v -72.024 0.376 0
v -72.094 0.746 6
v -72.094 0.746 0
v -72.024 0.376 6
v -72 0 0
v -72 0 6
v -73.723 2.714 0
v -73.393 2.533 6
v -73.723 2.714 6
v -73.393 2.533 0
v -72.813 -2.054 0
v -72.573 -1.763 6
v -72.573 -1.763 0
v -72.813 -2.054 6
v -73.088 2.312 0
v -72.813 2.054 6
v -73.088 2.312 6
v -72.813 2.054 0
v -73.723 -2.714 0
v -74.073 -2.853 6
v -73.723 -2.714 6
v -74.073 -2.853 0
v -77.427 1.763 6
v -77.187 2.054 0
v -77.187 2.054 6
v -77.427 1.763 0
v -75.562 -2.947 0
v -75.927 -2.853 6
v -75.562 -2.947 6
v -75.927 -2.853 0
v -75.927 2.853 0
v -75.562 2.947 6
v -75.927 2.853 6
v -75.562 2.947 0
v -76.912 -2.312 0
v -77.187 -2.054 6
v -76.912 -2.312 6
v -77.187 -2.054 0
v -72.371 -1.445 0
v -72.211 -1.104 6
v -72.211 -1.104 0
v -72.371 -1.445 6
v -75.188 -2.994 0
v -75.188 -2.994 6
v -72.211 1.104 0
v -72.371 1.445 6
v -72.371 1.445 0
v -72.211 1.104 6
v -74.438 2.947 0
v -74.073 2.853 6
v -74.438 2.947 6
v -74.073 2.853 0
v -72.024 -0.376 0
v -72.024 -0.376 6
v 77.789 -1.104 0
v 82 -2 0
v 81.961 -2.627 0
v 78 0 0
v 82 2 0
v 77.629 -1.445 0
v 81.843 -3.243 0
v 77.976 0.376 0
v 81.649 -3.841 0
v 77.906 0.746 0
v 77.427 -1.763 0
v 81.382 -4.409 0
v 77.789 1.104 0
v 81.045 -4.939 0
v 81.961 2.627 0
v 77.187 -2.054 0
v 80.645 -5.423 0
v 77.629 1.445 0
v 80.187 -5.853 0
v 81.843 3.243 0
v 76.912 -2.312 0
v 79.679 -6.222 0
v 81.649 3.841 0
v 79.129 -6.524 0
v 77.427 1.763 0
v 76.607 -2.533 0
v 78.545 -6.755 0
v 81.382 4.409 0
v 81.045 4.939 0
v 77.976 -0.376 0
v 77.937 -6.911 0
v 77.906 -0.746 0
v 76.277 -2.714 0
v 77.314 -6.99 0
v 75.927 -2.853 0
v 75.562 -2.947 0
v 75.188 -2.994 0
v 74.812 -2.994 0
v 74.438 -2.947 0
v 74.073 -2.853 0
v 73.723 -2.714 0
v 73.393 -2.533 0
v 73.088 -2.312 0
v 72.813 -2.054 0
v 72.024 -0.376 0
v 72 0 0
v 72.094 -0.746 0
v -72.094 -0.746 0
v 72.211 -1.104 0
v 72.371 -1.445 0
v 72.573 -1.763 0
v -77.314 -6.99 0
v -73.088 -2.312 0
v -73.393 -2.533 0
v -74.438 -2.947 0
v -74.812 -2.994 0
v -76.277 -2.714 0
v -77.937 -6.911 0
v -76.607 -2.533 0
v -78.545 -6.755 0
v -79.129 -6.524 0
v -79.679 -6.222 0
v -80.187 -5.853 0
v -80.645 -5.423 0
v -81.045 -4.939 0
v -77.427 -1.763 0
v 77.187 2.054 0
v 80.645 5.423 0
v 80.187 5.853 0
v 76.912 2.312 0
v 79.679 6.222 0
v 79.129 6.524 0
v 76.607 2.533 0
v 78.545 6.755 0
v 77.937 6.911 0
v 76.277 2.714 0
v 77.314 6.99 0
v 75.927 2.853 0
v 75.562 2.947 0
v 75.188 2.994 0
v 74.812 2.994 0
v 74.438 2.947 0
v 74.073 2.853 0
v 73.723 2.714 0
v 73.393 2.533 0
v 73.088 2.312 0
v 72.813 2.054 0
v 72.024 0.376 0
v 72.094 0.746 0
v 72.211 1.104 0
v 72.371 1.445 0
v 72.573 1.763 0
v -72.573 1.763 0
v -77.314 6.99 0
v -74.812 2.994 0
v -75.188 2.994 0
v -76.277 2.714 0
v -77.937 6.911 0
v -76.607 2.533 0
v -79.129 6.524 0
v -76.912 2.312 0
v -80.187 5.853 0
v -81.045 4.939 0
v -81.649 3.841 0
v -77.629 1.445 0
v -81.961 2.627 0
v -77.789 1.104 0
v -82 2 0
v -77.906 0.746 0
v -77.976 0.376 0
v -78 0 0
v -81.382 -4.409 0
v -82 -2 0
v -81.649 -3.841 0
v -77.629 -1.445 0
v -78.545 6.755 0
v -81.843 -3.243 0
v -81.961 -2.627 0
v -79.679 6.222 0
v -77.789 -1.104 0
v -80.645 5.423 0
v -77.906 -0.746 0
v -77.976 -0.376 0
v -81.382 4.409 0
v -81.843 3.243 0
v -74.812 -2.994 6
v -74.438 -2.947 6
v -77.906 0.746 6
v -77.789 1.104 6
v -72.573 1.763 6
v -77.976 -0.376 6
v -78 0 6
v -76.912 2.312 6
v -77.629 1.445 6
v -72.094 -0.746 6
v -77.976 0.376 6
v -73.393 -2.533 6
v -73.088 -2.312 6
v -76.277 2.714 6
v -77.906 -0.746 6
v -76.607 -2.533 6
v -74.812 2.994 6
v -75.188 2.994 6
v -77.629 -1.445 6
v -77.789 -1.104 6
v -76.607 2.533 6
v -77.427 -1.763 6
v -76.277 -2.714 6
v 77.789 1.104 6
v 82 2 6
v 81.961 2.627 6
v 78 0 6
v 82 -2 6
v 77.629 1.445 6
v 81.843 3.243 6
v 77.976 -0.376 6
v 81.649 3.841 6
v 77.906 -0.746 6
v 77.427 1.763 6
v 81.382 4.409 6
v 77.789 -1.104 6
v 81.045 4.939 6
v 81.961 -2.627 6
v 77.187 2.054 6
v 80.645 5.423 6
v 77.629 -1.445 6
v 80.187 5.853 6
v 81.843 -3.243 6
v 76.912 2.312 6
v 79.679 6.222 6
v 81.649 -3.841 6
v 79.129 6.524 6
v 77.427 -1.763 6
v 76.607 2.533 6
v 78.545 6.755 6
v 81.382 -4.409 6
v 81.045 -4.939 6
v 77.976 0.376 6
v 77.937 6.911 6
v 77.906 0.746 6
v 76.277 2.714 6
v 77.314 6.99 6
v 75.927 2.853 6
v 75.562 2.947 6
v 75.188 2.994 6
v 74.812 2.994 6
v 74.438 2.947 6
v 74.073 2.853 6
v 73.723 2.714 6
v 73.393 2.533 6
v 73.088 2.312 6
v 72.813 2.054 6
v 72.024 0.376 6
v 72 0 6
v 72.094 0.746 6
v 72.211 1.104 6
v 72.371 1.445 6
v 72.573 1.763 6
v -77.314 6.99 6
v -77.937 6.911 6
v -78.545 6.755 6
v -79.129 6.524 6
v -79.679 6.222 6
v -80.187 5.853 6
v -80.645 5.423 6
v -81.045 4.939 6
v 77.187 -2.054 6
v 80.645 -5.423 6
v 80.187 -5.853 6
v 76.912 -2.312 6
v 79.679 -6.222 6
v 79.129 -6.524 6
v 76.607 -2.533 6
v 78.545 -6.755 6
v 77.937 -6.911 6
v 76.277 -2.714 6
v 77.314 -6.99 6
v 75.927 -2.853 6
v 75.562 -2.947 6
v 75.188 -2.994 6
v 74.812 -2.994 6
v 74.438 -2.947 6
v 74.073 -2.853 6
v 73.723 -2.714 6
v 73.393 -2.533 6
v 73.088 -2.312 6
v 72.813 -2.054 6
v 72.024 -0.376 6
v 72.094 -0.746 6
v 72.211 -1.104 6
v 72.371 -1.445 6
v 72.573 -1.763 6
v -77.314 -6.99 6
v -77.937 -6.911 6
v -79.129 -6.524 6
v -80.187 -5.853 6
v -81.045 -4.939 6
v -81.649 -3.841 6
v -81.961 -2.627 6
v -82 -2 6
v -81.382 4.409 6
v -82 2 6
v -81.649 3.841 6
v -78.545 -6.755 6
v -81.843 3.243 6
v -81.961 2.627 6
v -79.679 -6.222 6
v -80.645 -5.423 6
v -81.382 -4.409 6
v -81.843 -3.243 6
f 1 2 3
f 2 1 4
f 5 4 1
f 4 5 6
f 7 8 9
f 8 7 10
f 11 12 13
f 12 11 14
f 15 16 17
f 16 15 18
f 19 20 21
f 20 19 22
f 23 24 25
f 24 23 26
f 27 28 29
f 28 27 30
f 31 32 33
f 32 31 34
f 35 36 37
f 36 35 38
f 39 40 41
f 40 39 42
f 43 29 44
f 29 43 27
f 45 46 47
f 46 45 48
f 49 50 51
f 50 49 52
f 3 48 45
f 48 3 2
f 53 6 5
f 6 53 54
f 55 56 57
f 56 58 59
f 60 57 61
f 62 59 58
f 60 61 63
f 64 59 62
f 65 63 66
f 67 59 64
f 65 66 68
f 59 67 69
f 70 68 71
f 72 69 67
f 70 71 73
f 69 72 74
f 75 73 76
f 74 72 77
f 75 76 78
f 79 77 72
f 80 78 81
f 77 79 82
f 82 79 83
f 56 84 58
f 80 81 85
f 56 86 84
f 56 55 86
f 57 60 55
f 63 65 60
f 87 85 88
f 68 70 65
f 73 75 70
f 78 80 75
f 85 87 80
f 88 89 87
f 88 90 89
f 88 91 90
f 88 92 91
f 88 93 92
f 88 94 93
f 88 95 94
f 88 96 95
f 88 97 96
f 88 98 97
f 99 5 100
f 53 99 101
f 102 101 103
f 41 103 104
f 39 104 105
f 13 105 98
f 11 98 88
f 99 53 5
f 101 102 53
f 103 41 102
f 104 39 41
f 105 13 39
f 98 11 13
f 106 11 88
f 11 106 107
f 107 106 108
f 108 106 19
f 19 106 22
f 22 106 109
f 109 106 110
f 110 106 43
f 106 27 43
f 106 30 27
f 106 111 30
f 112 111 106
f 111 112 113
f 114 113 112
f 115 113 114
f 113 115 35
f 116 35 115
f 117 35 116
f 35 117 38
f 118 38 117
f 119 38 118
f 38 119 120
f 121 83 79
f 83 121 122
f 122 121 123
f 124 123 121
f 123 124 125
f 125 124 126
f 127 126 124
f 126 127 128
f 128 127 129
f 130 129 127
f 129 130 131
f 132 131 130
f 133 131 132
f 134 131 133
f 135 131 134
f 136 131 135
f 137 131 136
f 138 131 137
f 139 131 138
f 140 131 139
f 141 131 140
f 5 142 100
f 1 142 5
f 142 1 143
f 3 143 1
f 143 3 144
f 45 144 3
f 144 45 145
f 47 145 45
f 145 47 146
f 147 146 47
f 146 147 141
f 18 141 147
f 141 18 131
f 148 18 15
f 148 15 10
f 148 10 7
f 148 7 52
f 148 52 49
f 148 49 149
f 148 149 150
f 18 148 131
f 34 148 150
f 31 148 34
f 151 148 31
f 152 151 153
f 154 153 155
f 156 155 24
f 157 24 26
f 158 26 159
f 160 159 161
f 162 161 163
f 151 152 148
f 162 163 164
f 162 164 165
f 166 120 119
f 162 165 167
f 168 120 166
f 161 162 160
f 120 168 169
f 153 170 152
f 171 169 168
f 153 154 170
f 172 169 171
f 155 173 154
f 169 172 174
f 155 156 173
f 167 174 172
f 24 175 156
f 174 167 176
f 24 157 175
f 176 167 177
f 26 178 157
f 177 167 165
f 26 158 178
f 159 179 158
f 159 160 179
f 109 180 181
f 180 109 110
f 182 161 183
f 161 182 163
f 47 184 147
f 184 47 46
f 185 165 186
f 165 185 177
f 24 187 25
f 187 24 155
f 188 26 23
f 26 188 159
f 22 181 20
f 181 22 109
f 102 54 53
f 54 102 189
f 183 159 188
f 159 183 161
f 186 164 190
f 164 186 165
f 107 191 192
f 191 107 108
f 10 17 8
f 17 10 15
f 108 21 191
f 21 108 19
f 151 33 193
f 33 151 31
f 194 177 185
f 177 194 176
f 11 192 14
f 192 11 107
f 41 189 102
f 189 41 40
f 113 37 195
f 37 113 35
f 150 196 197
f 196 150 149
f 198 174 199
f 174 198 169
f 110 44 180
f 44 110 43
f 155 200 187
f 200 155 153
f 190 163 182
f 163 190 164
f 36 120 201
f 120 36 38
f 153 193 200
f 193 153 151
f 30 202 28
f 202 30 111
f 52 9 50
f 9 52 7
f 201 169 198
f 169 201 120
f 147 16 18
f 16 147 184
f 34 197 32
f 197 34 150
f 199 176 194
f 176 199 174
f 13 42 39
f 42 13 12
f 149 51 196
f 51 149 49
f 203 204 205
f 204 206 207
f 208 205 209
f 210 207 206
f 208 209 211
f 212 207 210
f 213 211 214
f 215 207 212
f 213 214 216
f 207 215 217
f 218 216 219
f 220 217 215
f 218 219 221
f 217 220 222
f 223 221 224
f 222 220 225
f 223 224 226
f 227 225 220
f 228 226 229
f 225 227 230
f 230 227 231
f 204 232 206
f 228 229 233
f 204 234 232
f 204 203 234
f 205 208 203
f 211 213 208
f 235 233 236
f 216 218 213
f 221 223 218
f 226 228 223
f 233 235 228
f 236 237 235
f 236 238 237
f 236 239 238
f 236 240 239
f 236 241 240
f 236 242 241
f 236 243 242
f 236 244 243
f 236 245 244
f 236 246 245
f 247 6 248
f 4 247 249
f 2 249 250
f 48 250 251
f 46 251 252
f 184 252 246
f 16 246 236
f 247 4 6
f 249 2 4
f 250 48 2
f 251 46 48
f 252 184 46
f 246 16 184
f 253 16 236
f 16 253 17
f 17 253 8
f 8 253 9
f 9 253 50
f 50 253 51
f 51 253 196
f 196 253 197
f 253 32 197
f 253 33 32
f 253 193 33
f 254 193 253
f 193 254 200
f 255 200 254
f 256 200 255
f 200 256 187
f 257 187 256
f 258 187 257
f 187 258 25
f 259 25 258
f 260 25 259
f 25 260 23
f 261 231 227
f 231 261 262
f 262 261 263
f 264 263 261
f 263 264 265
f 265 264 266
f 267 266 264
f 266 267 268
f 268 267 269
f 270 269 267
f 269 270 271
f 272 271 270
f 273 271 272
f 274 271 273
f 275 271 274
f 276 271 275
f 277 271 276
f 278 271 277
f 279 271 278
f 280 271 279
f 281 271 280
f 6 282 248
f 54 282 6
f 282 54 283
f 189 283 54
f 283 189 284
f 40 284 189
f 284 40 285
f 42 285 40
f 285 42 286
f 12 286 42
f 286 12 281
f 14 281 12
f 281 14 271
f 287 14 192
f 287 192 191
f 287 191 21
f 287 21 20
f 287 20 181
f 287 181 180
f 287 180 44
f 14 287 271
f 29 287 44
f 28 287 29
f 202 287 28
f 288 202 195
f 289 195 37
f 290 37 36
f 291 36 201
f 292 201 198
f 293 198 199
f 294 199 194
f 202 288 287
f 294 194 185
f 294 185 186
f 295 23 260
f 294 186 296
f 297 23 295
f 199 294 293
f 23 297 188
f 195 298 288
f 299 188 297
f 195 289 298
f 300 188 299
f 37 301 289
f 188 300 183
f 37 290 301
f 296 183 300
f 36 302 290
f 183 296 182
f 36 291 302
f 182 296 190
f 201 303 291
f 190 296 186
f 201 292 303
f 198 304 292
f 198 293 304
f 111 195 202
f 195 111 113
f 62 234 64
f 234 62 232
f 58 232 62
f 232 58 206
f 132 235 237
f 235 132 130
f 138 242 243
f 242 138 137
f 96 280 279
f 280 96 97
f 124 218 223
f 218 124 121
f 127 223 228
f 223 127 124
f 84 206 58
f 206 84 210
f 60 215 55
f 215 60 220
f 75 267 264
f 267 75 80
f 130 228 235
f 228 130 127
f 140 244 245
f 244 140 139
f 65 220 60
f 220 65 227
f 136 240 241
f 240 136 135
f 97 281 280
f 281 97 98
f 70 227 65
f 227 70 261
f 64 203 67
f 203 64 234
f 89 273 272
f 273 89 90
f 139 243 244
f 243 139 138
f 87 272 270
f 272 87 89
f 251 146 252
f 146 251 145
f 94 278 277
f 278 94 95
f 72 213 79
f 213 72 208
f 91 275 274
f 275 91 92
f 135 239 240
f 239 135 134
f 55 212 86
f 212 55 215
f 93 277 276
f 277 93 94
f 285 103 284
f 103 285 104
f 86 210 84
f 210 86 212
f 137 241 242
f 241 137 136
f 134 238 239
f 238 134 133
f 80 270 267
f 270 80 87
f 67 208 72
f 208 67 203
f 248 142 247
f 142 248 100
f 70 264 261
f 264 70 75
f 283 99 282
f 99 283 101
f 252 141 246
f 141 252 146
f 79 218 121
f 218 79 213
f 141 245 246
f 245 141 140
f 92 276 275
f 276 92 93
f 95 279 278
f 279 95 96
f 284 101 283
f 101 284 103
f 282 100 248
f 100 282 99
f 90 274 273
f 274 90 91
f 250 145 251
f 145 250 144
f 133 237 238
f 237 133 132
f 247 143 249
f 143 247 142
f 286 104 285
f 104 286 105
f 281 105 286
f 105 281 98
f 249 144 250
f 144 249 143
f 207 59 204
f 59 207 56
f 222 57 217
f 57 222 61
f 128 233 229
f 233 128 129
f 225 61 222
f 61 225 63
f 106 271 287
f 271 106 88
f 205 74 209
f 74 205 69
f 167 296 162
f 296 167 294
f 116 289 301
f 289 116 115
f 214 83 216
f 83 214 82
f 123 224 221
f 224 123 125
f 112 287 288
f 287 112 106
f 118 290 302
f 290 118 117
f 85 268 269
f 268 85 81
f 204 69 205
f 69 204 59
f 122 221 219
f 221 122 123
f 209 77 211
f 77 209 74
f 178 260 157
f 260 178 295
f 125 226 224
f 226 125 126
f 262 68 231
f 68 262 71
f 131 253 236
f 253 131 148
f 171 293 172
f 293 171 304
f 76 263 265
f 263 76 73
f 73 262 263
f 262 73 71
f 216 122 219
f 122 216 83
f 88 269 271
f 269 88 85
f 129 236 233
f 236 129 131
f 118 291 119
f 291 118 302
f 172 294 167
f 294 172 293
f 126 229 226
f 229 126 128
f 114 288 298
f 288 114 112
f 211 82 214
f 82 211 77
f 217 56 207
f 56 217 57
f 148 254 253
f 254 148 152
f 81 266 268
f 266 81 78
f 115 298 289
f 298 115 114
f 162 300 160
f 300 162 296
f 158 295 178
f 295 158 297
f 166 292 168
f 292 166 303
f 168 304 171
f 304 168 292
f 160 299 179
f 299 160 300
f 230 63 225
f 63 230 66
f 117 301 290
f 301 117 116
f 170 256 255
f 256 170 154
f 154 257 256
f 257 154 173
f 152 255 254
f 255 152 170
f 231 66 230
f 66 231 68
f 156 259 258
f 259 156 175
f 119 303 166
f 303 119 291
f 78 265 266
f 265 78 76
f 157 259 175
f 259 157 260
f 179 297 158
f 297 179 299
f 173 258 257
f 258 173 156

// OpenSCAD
$fn = 50;


difference() {
	union() {
		hull() {
			translate(v = [-77.0000000000, 2.0000000000, 0]) {
				cylinder(h = 6, r = 5);
			}
			translate(v = [77.0000000000, 2.0000000000, 0]) {
				cylinder(h = 6, r = 5);
			}
			translate(v = [-77.0000000000, -2.0000000000, 0]) {
				cylinder(h = 6, r = 5);
			}
			translate(v = [77.0000000000, -2.0000000000, 0]) {
				cylinder(h = 6, r = 5);
			}
		}
	}
	union() {
		translate(v = [-75.0000000000, 0.0000000000, 0]) {
			cylinder(h = 6, r = 3.0000000000);
		}
		translate(v = [75.0000000000, 0.0000000000, 0]) {
			cylinder(h = 6, r = 3.0000000000);
		}
		translate(v = [-75.0000000000, 0.0000000000, 0]) {
			cylinder(h = 6, r = 1.5000000000);
		}
		translate(v = [75.0000000000, 0.0000000000, 0]) {
			cylinder(h = 6, r = 1.5000000000);
		}
		translate(v = [-75.0000000000, 0.0000000000, 0]) {
			cylinder(h = 6, r = 1.5000000000);
		}
		translate(v = [75.0000000000, 0.0000000000, 0]) {
			cylinder(h = 6, r = 1.5000000000);
		}
		translate(v = [-75.0000000000, 0.0000000000, 0]) {
			cylinder(h = 6, r = 1.5000000000);
		}
		translate(v = [75.0000000000, 0.0000000000, 0]) {
			cylinder(h = 6, r = 1.5000000000);
		}
	}
}
